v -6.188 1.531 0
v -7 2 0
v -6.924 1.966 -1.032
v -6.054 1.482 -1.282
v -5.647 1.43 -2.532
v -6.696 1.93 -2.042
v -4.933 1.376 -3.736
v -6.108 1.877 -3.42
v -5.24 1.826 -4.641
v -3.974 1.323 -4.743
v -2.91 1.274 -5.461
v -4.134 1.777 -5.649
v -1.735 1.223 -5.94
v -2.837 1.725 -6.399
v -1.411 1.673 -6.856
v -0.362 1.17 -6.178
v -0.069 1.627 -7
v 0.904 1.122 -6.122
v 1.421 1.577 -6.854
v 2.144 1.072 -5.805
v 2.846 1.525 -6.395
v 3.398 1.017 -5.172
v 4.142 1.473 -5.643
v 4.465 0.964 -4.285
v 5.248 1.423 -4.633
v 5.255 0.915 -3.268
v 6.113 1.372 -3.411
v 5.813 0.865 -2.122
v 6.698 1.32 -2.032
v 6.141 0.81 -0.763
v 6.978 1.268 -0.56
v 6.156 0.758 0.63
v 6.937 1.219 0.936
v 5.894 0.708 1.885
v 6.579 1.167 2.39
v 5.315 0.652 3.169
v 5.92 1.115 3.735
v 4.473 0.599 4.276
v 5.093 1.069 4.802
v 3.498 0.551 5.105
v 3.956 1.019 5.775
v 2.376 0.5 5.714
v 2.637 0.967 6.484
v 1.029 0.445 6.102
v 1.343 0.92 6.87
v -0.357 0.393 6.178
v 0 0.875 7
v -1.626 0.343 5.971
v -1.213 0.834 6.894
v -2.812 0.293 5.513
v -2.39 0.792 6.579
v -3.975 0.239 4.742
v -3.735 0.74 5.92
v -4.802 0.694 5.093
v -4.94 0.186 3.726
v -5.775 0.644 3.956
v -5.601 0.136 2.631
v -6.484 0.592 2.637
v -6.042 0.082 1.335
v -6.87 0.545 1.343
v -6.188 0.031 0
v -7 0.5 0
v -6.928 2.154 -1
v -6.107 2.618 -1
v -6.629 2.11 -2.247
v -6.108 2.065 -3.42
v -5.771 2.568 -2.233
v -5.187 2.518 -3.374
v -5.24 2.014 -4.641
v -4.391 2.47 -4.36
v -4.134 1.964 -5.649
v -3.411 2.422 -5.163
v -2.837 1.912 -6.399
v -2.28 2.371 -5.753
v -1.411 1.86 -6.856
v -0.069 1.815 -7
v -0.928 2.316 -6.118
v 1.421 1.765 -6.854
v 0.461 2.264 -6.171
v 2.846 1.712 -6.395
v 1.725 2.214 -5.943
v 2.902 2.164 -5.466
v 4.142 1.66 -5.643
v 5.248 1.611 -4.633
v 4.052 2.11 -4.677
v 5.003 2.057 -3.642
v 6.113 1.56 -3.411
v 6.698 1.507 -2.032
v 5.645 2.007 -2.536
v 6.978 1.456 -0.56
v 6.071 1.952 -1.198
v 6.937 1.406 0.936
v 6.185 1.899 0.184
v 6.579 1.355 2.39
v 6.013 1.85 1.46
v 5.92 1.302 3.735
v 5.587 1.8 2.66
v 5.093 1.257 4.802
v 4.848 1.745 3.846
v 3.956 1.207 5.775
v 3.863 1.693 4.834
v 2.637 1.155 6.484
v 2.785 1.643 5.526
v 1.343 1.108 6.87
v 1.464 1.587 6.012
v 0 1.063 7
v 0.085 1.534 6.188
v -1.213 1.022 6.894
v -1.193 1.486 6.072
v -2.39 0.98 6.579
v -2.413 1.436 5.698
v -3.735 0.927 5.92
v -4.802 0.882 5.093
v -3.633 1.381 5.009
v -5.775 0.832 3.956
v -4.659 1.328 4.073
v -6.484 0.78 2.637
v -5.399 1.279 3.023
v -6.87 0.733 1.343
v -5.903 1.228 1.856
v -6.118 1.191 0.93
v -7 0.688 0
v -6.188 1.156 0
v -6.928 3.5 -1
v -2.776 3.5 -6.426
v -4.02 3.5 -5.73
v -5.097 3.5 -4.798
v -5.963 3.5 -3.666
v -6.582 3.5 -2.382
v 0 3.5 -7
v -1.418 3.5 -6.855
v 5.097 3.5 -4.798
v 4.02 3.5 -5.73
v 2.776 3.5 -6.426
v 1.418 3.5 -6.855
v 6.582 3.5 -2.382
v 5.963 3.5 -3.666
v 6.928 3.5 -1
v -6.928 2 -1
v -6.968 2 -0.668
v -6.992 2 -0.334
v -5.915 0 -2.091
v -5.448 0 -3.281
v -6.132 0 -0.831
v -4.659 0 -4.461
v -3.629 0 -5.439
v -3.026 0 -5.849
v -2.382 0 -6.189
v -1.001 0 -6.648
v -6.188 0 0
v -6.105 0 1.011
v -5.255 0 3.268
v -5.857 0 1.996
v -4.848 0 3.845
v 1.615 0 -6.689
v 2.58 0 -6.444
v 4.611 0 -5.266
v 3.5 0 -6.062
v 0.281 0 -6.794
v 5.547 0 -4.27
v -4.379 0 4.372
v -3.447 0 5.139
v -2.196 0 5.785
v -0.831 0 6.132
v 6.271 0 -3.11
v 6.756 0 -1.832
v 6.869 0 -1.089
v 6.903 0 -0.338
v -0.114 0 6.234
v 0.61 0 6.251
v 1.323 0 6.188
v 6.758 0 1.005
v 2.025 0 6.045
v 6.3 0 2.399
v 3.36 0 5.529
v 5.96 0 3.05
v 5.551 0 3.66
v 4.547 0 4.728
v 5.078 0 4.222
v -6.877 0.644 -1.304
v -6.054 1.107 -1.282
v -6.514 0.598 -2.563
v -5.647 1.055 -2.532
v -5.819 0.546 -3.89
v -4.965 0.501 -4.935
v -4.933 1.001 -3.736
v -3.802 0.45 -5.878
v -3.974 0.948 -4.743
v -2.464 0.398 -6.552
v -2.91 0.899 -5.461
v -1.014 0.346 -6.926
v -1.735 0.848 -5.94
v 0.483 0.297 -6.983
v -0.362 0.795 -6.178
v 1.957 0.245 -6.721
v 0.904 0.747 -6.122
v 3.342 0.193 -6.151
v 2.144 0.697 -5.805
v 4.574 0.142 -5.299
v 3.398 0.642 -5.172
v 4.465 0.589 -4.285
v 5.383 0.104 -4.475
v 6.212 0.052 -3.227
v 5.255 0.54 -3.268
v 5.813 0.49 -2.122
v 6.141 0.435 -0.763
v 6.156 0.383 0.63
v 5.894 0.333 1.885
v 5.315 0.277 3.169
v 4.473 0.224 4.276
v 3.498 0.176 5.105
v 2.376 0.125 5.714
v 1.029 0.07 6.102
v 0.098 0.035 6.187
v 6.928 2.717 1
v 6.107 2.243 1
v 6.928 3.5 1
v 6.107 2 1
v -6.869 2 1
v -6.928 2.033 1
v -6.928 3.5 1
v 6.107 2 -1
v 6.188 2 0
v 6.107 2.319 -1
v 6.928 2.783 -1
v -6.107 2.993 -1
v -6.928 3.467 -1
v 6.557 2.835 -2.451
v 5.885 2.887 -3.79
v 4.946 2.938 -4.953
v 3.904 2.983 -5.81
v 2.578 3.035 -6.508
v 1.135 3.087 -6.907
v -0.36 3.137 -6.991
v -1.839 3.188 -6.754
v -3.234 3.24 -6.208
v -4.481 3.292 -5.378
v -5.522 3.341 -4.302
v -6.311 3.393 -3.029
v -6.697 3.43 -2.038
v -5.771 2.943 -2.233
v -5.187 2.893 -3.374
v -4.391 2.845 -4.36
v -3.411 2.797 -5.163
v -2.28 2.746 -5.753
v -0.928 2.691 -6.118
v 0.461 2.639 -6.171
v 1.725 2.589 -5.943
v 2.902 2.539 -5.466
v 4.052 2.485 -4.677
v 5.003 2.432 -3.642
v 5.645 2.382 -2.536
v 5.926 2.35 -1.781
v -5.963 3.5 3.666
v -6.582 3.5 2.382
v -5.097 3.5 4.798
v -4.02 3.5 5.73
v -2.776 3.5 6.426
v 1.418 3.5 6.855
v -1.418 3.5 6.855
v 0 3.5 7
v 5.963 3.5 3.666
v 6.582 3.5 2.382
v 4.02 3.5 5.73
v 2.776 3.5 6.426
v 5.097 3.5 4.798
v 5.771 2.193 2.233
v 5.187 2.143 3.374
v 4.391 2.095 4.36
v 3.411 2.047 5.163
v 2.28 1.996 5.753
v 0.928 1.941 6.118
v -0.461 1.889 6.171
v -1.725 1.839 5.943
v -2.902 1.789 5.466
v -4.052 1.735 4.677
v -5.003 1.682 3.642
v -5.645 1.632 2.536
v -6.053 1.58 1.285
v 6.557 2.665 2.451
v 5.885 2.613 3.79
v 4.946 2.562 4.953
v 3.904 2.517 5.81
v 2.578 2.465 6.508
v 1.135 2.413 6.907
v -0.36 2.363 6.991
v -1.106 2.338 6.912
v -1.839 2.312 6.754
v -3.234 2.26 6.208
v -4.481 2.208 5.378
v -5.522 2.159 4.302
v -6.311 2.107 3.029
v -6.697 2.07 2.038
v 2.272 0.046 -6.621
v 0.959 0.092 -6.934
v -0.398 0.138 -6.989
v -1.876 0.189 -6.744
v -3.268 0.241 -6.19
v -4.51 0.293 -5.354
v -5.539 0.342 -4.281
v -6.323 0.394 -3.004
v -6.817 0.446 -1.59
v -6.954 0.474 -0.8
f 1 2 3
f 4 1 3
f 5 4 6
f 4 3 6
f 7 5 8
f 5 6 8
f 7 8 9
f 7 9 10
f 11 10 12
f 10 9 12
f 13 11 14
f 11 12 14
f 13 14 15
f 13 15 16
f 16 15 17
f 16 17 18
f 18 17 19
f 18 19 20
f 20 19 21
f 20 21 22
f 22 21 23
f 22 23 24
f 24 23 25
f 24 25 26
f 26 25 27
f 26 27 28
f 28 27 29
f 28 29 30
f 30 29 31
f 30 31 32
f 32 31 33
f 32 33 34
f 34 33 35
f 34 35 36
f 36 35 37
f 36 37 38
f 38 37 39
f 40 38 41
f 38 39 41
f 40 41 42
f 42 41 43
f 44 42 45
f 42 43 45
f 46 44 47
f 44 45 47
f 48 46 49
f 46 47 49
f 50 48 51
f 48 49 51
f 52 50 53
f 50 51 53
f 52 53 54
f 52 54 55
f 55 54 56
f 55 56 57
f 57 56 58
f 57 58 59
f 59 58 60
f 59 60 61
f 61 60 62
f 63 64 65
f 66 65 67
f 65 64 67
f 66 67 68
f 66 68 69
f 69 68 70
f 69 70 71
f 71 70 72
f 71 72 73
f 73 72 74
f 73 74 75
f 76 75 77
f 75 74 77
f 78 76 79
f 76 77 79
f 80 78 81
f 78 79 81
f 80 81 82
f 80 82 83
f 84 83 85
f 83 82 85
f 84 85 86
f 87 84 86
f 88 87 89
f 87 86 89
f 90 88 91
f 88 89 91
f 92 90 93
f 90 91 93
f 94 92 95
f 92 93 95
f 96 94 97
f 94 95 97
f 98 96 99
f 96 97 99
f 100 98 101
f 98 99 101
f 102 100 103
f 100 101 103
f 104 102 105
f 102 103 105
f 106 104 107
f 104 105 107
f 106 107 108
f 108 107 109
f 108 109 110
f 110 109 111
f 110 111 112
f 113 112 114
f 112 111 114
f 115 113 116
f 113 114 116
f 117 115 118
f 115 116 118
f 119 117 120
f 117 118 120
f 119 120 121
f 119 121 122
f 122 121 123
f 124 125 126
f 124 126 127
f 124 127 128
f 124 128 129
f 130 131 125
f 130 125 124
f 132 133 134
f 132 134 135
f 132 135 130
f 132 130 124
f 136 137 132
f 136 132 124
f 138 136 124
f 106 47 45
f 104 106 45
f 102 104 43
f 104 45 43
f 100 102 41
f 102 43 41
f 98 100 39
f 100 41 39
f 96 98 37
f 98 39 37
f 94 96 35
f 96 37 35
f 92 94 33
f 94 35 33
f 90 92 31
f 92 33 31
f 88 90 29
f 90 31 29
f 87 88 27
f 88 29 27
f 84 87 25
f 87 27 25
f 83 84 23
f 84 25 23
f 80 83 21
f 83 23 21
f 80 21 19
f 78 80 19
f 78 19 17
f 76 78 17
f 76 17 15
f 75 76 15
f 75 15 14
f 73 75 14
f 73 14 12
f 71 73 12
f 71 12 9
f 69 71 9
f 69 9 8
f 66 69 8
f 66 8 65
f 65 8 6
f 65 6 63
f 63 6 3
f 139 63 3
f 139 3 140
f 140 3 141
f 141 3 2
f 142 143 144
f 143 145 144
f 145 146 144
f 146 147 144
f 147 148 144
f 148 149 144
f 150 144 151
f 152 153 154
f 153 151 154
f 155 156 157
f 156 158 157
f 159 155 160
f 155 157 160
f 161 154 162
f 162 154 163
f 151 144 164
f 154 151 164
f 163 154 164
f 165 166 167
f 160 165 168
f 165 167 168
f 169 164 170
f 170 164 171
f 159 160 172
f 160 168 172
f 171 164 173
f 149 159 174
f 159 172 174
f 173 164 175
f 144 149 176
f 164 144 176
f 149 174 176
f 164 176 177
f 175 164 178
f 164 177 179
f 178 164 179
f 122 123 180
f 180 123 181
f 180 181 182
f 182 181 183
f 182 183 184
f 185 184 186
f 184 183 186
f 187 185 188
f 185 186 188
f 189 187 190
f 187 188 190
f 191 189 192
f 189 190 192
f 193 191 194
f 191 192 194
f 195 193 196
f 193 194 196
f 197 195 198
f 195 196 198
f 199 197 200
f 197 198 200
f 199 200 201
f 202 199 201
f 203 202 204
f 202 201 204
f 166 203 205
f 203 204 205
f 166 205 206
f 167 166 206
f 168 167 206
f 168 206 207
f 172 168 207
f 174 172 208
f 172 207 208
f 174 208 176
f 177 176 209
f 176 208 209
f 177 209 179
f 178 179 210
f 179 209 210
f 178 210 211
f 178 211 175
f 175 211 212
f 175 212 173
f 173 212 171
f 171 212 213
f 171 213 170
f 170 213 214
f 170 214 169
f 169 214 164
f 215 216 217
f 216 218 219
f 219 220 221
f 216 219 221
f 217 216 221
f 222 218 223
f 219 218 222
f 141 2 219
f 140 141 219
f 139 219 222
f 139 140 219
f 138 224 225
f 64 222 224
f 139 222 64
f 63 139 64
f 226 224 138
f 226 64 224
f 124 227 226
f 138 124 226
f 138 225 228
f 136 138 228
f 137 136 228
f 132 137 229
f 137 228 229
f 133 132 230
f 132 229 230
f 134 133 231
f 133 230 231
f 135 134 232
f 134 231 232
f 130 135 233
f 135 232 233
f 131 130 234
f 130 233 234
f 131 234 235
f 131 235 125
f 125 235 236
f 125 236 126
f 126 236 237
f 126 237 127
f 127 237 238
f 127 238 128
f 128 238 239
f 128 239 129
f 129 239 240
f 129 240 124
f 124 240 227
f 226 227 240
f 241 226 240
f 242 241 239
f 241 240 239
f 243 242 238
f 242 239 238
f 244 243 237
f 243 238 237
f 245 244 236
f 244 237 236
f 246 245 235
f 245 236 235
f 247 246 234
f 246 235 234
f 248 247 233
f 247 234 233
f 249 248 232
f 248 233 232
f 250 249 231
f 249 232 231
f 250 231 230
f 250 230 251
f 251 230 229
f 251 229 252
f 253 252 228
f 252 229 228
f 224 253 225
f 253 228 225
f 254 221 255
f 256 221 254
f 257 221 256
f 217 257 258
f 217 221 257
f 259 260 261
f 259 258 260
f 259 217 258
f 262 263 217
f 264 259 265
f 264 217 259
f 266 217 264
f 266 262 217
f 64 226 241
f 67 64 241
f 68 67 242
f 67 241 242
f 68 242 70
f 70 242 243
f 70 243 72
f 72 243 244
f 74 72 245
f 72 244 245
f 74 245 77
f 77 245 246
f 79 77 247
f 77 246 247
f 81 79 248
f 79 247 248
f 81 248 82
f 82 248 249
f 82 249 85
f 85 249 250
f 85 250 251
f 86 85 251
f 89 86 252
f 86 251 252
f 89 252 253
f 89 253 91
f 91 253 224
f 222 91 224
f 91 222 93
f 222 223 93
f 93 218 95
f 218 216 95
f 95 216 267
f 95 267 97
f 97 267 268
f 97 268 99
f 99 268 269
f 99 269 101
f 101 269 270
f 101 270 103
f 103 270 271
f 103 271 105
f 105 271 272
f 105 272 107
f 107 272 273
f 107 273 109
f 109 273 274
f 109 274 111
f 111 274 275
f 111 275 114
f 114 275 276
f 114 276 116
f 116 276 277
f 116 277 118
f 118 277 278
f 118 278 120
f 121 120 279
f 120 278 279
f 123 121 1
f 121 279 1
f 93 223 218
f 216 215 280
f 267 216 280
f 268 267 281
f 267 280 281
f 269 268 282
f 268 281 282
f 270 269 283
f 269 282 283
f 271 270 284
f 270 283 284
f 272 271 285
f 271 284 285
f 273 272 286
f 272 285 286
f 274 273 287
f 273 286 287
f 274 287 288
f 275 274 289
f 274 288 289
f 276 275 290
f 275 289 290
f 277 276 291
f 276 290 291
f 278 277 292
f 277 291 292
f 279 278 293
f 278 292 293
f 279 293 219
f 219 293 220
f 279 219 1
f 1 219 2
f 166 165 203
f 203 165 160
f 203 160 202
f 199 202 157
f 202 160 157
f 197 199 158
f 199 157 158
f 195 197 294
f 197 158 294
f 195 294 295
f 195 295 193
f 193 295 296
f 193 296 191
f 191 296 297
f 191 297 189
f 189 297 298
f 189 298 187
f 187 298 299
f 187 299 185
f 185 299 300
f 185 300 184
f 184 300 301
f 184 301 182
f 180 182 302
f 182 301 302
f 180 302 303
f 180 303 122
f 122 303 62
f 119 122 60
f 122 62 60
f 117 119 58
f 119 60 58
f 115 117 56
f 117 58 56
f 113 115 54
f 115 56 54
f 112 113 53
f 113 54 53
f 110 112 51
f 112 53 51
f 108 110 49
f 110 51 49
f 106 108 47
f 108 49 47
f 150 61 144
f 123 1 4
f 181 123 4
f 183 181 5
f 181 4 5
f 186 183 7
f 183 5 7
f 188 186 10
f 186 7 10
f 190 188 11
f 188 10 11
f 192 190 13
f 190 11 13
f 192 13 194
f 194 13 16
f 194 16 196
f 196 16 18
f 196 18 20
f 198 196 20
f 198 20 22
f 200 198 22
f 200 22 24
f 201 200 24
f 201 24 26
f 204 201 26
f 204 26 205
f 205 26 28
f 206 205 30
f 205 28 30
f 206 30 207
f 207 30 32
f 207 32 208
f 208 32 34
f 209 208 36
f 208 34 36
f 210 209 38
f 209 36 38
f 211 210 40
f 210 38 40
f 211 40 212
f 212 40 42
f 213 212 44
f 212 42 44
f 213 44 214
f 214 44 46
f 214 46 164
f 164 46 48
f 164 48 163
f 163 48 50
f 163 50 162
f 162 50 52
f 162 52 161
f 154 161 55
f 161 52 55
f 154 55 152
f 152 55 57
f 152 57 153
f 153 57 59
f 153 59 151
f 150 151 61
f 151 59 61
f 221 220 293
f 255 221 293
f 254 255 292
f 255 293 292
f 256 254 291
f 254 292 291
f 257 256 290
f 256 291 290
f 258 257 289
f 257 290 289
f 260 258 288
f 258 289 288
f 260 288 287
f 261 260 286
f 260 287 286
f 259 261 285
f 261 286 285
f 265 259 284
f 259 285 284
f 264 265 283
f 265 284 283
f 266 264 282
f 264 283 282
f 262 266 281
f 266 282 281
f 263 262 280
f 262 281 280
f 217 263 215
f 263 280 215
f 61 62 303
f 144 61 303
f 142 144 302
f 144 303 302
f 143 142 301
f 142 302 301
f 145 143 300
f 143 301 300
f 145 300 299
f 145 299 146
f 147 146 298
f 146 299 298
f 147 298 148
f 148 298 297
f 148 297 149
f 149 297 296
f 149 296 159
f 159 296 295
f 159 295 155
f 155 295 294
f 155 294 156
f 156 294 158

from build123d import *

# Parameters (mm, degrees)
SKETCH_1_R               = 7
EXTRUDE_1_DEPTH          = 3.5
THREAD_1_PITCH           = 1.5
CUT_EXTRUDE_1_DEPTH      = 11.5000004
CUT_EXTRUDE_1_DEPTH_BACK = 11.5000004
SKETCH_4_W               = 2
SKETCH_4_H               = 1.5


with BuildPart() as part:
    # Sketch 1 → Бобышка-Вытянуть1 (new body)
    with BuildSketch(Plane(origin=(0, 0, 0), x_dir=(1, 0, 0), z_dir=(0, 1, 0))):
        with Locations(Location((0, 0, 0), (0, 0, 270))):
            Circle(SKETCH_1_R)
    extrude(amount=EXTRUDE_1_DEPTH)

    # Резьба1: the profile of Sketch 1 2 profile screwed along a right-hand helix of 2.333333 turns, 8 arcs to a turn; built about Z, then put on its axis
    thread_1_z = Axis((0, 0, 0), (0, 0, 1))
    thread_1_corners = [(7.0003, 0, -0.000173205), (7.0003, 0, 1.312673201), (6.188101188, 0, 0.843749998), (6.188101188, 0, 0.468749998)]
    with BuildLine(mode=Mode.PRIVATE) as thread_1_profile:
        Line(thread_1_corners[0], thread_1_corners[1])
        Line(thread_1_corners[1], thread_1_corners[2])
        Line(thread_1_corners[2], thread_1_corners[3])
        Line(thread_1_corners[3], thread_1_corners[0])
    thread_1_cap = Face(thread_1_profile.wire())
    thread_1_turn_angles = [0, 22.5, 45, 67.5, 90, 112.5, 135, 157.5, 180, 202.5, 225, 247.5, 270, 292.5, 315, 337.5, 360]
    thread_1_turn_weights = [1, 0.9238795325112867, 1, 0.9238795325112867, 1, 0.9238795325112867, 1, 0.9238795325112867, 1, 0.9238795325112867, 1, 0.9238795325112867, 1, 0.9238795325112867, 1, 0.9238795325112867, 1]
    thread_1_turn_rails = [Edge.make_bspline([Vector(p[0], p[1], 0).rotate(thread_1_z, thread_1_turn_angles[k]) / thread_1_turn_weights[k] + Vector(0, 0, p[2] + THREAD_1_PITCH * thread_1_turn_angles[k] / 360) for k in range(17)], [0, 0, 0, 1, 1, 2, 2, 3, 3, 4, 4, 5, 5, 6, 6, 7, 7, 8, 8, 8], 2, thread_1_turn_weights) for p in thread_1_corners]
    thread_1_turn_sides = [Face.make_surface_from_curves(thread_1_turn_rails[p[0]], thread_1_turn_rails[p[1]]) for p in [(0, 1), (1, 2), (2, 3), (3, 0)]]
    thread_1_last_angles = [720, 742.5, 765, 787.5, 810, 825, 840]
    thread_1_last_weights = [1, 0.9238795325112867, 1, 0.9238795325112867, 1, 0.9659258262890685, 1]
    thread_1_last_rails = [Edge.make_bspline([Vector(p[0], p[1], 0).rotate(thread_1_z, thread_1_last_angles[k]) / thread_1_last_weights[k] + Vector(0, 0, p[2] + THREAD_1_PITCH * thread_1_last_angles[k] / 360) for k in range(7)], [0, 0, 0, 1, 1, 2, 2, 3, 3, 3], 2, thread_1_last_weights) for p in thread_1_corners]
    thread_1_last_sides = [Face.make_surface_from_curves(thread_1_last_rails[p[0]], thread_1_last_rails[p[1]]) for p in [(0, 1), (1, 2), (2, 3), (3, 0)]]
    thread_1 = Plane(origin=(0, 3.5, 0), x_dir=(-1, 0, 0), z_dir=(0, -1, 0)) * Solid(Shell([*[p.moved(Location((0, 0, THREAD_1_PITCH * i))) for i in range(2) for p in thread_1_turn_sides], *thread_1_last_sides, thread_1_cap, thread_1_cap.rotate(thread_1_z, 840).moved(Location((0, 0, THREAD_1_PITCH * 840 / 360)))]))
    add(thread_1, mode=Mode.SUBTRACT)

    # Эскиз4 → Вырез-Вытянуть1 (cut, two sides: drawn at the far end of the back side and taken through both)
    with BuildSketch(Plane(origin=(0, 0, 0), x_dir=(0, 0, -1), z_dir=(1, 0, 0)).offset(-CUT_EXTRUDE_1_DEPTH_BACK)):
        with Locations((0, 2.75)):
            Rectangle(SKETCH_4_W, SKETCH_4_H)
    extrude(amount=CUT_EXTRUDE_1_DEPTH + CUT_EXTRUDE_1_DEPTH_BACK, mode=Mode.SUBTRACT)


solid = part.part
